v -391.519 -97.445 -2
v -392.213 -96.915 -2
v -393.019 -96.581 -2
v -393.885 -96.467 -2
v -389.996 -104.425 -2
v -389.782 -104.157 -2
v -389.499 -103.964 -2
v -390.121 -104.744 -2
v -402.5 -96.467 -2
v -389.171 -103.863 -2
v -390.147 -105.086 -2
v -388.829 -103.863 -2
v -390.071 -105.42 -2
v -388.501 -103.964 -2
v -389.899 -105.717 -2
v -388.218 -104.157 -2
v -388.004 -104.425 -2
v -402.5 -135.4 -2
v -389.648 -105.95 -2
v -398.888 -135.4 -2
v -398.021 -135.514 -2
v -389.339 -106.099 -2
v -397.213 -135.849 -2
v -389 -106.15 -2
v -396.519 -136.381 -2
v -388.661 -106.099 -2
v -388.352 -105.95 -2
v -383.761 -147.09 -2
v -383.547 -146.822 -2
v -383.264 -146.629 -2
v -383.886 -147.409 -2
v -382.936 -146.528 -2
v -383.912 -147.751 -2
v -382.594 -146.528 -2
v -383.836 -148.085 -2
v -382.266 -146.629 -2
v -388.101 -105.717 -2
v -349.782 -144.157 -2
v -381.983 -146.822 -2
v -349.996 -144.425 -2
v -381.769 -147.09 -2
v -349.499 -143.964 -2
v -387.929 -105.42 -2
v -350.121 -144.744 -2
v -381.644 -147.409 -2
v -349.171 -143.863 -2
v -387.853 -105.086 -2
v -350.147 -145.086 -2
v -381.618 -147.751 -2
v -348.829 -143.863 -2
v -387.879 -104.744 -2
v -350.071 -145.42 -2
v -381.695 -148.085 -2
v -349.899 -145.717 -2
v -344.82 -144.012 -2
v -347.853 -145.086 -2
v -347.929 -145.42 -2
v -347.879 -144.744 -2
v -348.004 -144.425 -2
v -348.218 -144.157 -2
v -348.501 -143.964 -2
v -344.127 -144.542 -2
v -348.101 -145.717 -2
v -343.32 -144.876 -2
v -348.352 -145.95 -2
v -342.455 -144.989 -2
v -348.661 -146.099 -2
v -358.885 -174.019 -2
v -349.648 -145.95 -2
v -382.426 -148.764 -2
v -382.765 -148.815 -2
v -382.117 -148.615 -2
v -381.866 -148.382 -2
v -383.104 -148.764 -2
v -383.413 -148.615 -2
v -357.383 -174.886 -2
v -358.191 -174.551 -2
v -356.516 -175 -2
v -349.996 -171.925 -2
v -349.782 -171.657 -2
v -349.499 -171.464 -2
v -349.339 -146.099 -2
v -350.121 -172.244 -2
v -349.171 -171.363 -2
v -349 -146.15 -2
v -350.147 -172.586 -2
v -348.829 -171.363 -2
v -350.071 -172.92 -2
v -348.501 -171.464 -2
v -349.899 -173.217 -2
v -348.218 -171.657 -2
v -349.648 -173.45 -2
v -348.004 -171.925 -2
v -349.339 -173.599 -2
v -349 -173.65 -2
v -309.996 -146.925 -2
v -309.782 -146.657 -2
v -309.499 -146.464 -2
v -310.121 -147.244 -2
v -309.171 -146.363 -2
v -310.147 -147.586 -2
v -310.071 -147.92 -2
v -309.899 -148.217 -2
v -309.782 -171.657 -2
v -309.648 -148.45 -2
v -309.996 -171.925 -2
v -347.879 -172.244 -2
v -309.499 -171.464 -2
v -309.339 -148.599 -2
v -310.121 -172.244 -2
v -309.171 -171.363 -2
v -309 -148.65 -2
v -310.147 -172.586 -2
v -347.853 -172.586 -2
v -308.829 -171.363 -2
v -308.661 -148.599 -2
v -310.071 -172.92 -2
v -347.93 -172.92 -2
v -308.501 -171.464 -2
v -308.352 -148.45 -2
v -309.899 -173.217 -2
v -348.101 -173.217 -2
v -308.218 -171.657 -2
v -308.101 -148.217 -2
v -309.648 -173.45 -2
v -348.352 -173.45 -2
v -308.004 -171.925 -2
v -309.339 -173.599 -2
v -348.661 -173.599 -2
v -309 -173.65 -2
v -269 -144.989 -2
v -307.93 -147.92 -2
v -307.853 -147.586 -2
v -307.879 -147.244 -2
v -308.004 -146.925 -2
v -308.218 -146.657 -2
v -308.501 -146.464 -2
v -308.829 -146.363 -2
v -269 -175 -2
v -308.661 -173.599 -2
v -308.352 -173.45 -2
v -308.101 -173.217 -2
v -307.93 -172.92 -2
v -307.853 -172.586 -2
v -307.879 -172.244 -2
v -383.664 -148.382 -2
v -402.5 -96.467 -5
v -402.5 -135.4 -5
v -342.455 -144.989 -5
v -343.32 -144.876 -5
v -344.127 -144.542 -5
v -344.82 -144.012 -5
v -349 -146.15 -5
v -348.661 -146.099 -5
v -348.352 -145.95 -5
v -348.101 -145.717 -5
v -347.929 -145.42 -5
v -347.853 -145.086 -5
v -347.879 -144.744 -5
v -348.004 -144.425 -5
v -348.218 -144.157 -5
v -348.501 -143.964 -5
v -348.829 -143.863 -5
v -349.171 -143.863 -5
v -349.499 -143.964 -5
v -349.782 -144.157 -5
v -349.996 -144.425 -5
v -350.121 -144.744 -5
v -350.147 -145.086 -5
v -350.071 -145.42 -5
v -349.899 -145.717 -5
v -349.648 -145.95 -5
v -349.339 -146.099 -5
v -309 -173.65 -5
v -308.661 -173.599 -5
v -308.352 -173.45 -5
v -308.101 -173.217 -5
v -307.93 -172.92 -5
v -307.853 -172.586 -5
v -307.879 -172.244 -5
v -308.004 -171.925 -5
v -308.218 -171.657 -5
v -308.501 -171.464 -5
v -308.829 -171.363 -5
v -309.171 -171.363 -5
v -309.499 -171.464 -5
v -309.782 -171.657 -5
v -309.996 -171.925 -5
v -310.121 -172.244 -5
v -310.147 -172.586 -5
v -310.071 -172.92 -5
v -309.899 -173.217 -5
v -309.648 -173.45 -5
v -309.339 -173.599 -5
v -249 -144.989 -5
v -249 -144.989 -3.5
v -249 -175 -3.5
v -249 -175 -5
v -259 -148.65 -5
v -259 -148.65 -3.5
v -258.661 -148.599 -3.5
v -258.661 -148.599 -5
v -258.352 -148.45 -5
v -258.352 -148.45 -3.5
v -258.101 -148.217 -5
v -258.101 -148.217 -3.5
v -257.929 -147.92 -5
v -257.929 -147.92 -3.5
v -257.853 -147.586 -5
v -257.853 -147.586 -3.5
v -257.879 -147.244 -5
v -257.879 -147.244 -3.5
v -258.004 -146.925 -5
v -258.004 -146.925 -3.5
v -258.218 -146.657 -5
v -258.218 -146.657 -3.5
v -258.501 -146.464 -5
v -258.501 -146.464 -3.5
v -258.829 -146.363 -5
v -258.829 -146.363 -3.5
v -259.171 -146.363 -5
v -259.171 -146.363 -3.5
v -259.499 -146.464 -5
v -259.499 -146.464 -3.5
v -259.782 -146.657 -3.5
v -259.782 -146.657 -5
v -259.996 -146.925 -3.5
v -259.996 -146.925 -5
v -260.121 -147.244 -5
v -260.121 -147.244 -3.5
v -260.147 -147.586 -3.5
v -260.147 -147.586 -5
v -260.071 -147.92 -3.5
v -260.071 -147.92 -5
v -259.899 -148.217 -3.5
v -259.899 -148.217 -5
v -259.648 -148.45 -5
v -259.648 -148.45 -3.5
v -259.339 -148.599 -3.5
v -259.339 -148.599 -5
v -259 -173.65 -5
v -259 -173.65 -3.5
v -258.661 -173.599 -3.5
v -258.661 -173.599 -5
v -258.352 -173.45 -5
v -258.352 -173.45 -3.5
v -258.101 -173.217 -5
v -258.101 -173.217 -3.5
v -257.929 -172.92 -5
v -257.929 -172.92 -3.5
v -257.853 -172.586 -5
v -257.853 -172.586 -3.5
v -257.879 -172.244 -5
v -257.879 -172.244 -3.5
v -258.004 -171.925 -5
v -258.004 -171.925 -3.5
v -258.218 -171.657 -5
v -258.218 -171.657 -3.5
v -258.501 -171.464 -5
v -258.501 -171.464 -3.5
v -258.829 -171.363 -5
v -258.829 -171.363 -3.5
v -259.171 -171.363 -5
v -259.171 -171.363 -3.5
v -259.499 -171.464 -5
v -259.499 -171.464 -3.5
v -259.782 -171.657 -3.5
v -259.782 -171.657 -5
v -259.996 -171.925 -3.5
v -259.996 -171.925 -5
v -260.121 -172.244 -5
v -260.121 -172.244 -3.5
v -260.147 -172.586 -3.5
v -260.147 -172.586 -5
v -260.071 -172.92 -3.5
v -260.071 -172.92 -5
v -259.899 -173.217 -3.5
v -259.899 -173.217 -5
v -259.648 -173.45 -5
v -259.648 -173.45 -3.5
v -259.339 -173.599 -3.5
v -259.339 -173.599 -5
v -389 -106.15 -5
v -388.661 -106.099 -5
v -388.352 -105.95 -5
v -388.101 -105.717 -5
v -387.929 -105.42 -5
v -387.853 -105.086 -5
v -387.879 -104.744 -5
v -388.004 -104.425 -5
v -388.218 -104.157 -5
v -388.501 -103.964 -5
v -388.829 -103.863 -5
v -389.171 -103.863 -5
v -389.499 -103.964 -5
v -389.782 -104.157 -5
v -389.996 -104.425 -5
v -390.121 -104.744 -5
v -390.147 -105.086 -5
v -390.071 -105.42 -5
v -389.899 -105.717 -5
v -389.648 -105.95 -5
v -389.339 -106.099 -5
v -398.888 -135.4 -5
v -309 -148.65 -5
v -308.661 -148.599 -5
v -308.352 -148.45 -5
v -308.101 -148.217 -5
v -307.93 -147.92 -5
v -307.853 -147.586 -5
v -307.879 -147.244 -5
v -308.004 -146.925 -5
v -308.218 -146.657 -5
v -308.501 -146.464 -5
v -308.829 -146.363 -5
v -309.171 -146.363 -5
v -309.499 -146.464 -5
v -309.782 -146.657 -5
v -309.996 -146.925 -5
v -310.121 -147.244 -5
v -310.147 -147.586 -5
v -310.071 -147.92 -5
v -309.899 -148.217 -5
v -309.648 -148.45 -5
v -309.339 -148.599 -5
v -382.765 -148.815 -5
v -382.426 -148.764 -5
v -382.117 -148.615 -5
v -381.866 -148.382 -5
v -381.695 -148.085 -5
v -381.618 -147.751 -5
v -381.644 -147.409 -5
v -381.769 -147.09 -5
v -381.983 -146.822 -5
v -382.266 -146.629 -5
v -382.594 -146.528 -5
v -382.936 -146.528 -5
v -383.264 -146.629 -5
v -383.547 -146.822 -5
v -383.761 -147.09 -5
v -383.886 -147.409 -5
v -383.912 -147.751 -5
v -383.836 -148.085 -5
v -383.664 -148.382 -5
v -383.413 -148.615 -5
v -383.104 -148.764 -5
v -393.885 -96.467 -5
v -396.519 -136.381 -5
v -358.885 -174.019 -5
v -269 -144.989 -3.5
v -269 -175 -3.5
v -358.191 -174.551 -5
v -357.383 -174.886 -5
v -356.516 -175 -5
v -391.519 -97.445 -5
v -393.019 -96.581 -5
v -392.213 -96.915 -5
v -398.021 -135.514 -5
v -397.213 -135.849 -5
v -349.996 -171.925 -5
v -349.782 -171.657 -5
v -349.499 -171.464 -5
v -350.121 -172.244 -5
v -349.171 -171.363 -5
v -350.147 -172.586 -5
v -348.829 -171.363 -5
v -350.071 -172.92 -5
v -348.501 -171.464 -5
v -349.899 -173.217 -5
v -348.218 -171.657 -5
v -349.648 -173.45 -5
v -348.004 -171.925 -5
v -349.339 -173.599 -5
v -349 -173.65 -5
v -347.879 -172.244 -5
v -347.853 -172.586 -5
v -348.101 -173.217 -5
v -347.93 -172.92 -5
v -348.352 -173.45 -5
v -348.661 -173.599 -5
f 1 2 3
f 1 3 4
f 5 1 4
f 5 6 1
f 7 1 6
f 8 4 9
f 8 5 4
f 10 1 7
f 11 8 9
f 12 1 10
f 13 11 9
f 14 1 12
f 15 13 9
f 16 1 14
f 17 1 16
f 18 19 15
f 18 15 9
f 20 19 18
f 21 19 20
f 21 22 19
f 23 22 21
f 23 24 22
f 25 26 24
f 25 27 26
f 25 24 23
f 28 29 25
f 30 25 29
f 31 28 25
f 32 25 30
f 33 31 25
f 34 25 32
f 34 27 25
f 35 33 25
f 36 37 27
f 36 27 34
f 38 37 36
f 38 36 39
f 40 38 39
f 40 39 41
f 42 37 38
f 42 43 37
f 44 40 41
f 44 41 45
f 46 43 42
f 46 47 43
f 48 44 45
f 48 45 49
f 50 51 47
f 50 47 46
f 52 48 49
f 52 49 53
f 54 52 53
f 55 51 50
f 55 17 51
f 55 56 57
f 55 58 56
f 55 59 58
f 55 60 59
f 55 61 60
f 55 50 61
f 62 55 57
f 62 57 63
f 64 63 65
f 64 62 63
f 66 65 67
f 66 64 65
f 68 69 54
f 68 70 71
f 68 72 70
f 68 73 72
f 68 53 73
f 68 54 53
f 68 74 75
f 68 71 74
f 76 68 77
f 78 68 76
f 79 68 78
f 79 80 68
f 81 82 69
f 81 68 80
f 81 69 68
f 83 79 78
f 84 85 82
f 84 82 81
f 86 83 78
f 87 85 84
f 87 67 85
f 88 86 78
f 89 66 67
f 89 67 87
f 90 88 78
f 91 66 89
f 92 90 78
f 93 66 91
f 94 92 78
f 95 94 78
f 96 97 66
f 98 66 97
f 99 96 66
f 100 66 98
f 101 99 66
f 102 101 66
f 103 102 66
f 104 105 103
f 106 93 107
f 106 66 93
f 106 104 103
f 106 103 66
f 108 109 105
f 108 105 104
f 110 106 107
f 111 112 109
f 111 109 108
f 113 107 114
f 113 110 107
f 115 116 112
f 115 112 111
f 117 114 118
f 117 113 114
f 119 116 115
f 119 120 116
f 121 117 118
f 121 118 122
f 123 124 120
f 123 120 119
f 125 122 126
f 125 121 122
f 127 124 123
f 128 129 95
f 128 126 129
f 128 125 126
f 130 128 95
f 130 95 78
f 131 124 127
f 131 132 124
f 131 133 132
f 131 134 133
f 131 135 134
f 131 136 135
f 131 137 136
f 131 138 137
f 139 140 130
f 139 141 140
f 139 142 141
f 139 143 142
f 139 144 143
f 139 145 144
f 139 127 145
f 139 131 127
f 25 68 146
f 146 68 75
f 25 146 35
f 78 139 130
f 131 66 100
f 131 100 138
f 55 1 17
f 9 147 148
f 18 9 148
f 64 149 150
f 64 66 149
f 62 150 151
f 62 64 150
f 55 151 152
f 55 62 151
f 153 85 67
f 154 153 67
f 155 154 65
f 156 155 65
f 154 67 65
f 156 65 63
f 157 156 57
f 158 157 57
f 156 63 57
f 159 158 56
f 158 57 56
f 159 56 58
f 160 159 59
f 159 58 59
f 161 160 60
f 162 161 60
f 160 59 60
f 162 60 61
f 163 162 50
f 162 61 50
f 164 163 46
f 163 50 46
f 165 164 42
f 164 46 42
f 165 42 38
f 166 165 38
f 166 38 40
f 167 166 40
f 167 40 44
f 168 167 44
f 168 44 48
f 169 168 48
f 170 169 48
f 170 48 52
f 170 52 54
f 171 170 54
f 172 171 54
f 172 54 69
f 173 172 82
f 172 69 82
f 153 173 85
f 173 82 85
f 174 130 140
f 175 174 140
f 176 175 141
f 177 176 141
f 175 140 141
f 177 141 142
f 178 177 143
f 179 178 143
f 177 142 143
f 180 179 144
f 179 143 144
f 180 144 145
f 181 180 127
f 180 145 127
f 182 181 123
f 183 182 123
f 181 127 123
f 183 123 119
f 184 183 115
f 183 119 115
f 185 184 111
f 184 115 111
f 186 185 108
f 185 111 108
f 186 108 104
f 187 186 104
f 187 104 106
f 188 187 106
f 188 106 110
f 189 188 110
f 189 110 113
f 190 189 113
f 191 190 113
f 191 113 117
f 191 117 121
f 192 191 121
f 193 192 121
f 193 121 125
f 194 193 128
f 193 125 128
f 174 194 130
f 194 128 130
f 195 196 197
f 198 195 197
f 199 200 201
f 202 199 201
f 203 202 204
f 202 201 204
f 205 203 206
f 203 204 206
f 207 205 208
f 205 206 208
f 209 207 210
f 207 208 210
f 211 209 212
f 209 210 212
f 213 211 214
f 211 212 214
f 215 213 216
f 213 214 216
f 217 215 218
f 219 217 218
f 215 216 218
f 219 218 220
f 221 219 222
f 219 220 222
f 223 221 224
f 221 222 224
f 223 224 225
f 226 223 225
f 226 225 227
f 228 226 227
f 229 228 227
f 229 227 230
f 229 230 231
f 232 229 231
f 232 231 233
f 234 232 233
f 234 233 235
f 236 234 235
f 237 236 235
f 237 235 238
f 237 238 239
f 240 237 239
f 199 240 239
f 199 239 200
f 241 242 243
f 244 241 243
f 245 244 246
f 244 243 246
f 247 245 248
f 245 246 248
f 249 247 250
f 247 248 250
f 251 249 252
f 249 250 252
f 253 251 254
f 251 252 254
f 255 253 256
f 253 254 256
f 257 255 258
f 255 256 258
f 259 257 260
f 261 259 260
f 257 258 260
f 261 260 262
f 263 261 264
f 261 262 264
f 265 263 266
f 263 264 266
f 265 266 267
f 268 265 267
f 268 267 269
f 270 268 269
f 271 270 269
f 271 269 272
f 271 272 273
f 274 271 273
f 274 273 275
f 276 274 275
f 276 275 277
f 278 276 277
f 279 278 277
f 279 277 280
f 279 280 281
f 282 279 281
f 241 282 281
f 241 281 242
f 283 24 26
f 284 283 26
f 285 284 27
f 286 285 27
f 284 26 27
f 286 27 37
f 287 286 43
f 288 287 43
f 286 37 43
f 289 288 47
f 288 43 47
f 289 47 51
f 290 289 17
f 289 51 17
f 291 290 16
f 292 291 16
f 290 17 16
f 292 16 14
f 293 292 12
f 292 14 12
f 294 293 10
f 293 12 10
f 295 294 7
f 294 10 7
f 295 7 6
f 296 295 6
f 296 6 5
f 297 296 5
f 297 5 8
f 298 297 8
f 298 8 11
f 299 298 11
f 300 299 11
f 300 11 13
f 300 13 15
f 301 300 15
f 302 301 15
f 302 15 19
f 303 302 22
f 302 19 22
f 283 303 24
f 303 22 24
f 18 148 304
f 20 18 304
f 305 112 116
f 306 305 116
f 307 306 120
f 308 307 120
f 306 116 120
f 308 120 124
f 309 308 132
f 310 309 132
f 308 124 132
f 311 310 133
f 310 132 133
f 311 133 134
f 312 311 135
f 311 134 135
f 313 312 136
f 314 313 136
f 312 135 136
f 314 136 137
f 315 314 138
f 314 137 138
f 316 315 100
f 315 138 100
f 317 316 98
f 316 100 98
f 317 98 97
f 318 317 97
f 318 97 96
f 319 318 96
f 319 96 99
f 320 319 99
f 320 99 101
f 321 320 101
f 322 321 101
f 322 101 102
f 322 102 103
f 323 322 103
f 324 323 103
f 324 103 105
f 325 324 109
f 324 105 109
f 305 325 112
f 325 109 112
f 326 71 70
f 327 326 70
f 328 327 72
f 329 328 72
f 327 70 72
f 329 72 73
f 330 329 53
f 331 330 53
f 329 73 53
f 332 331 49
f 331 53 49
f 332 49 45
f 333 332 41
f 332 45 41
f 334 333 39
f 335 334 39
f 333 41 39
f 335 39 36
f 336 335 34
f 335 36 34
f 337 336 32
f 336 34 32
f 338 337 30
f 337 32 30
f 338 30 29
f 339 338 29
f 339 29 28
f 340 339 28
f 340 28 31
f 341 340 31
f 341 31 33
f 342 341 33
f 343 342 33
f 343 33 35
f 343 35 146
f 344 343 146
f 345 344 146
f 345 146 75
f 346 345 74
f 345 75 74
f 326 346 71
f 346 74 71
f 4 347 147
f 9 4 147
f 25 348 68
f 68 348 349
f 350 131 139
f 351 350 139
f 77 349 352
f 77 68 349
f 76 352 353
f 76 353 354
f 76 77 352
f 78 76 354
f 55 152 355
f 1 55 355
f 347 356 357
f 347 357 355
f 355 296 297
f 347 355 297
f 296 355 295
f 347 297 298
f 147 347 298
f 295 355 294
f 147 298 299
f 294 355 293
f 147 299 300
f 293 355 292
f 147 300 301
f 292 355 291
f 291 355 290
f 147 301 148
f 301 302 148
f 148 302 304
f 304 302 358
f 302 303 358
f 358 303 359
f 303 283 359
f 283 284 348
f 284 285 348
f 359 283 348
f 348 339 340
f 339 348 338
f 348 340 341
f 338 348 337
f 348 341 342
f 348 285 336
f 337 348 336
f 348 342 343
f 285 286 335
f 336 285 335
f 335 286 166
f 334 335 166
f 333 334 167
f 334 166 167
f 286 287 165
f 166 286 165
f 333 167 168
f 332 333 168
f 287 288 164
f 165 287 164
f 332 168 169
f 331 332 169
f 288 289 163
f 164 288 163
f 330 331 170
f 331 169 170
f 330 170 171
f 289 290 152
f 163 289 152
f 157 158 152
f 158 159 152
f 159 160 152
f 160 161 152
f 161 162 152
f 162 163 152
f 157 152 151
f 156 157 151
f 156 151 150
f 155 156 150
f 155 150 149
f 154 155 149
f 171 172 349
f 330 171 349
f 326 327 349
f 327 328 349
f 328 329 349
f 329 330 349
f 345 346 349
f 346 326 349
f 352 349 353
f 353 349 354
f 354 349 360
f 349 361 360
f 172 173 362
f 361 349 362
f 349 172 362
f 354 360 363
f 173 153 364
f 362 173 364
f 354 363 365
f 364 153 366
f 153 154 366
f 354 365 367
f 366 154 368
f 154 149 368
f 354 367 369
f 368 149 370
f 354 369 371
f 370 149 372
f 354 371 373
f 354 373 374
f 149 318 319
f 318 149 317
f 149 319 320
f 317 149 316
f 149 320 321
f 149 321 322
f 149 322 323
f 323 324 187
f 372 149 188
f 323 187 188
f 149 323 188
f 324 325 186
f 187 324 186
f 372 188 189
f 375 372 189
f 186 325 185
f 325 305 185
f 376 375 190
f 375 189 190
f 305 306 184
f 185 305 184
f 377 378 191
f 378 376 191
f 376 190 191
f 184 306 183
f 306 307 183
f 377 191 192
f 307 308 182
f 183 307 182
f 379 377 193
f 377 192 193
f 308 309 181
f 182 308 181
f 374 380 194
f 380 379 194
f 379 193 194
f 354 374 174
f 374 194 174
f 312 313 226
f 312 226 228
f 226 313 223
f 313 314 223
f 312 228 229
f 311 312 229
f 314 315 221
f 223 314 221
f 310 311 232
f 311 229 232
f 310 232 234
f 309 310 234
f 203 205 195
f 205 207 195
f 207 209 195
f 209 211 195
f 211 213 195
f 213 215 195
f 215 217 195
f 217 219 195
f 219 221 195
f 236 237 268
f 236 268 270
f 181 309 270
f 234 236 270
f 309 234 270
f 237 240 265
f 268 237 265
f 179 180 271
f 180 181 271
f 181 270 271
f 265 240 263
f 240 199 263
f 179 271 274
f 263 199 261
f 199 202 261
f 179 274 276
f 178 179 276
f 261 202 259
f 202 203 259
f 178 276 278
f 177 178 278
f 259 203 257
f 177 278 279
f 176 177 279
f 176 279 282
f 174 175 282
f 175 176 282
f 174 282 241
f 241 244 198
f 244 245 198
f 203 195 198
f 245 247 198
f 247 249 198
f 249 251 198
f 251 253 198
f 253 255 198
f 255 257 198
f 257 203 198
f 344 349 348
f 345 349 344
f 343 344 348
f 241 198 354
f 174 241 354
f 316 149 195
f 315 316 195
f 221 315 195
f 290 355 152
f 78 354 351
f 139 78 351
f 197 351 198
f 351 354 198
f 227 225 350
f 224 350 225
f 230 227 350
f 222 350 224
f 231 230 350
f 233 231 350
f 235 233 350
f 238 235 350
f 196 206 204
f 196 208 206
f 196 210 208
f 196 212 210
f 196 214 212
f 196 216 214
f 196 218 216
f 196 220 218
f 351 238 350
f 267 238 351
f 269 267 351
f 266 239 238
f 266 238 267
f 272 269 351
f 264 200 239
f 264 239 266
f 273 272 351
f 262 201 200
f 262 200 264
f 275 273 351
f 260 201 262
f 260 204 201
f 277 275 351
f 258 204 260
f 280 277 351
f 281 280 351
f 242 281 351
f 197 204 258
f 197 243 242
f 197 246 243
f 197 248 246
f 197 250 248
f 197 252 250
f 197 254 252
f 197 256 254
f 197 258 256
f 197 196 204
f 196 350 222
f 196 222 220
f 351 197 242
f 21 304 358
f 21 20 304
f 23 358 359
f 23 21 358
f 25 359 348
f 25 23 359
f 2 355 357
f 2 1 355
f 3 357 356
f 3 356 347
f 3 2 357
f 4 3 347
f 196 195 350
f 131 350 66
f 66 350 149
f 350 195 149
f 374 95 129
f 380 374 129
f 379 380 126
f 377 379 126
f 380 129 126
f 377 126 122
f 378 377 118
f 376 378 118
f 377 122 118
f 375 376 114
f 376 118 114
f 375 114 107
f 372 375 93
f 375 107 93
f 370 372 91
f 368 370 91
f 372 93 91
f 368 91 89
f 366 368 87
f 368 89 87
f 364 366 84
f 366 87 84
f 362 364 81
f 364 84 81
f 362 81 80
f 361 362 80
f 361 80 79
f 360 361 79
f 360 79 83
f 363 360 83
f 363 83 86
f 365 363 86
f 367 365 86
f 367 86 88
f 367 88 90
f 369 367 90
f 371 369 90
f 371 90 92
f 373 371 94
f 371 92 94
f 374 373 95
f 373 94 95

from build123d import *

# Parameters (mm, degrees)
PAD011_DEPTH            = 3
FILLET036_R             = 3.35
SKETCH183_R             = 1.15
POCKET052_DEPTH         = 3
POCKET054_DEPTH         = 5
SKETCH187_W             = 31
SKETCH187_H             = 20
POCKET055_DEPTH         = 1.5
BODY023_ROLL_ANGLE      = 180
BODY023_PLACEMENT_ANGLE = -90


with BuildPart() as part:
    # Sketch182 → Pad011 (new body)
    with BuildSketch(Plane(origin=(0, 0, 0), x_dir=(1, 0, 0), z_dir=(0, 0, -1))):
        Polygon((101.467362, -402.500006), (130.400002, -402.500006), (135.400002, -402.500006), (135.400002, -397.500006), (174.999975, -357.90402), (174.999975, -245), (289.999995, -245), (294.999995, -245), (294.999995, -215), (289.999995, -215), (224.999995, -215), (224.999995, -199.999997), (219.999995, -199.999997), (199.999995, -199.999997), (194.999995, -199.999997), (194.999995, -215.000003), (168.459985, -215.000003), (161.999993, -198.359996), (161.999993, -115.000006), (161.999993, -110.000006), (156.999993, -110.000006), (134.576923, -122.534363), (131.999997, -126.895911), (131.999997, -200.027011), (144.989344, -239.967928), (144.989344, -343.839368), (96.467362, -392.500006), (96.467362, -397.500006), (96.467362, -402.500006), align=None)
    extrude(amount=PAD011_DEPTH)

    # Fillet036
    fillet036_edges = [part.edges().sort_by_distance(p)[0] for p in [
        (194.999995, 215.000003, -1.5),
        (168.459985, 215.000003, -1.5),
        (161.999993, 198.359996, -1.5),
        (161.999993, 110.000006, -1.5),
        (156.999993, 110.000006, -1.5),
        (134.576923, 122.534363, -1.5),
        (131.999997, 126.895911, -1.5),
        (131.999997, 200.027011, -1.5),
        (144.989344, 239.967928, -1.5),
        (144.989344, 343.839368, -1.5),
        (96.467362, 392.500006, -1.5),
        (135.400002, 397.500006, -1.5),
        (174.999975, 357.90402, -1.5),
        (174.999975, 245, -1.5),
        (294.999995, 245, -1.5),
        (294.999995, 215, -1.5),
        (224.999995, 215, -1.5),
    ]]
    fillet(fillet036_edges, radius=FILLET036_R)

    # Sketch183 (on Face5 of Fillet036) → Pocket052 (cut)
    with BuildSketch(Plane(origin=(0, 0, -3), x_dir=(1, 0, 0), z_dir=(0, 0, -1))):
        with Locations((105, -389)):
            Circle(SKETCH183_R)
        with Locations((145, -349)):
            Circle(SKETCH183_R)
        with Locations((147.500002, -309.000005)):
            Circle(SKETCH183_R)
        with Locations((147.500002, -259.000004)):
            Circle(SKETCH183_R)
        with Locations((172.500003, -259.000004)):
            Circle(SKETCH183_R)
        with Locations((172.500003, -309.000005)):
            Circle(SKETCH183_R)
        with Locations((172.500003, -349.000005)):
            Circle(SKETCH183_R)
        with Locations((147.665007, -382.765018)):
            Circle(SKETCH183_R)
        with Locations((178.000003, -242.500004)):
            Circle(SKETCH183_R)
        with Locations((218.000003, -242.500004)):
            Circle(SKETCH183_R)
        with Locations((258.000004, -242.500004)):
            Circle(SKETCH183_R)
        with Locations((258.000004, -217.500003)):
            Circle(SKETCH183_R)
        with Locations((292, -242.500004)):
            Circle(SKETCH183_R)
        with Locations((292.000004, -217.500003)):
            Circle(SKETCH183_R)
        with Locations((292.500004, -230.000003)):
            Circle(SKETCH183_R)
        with Locations((223.000003, -217.000003)):
            Circle(SKETCH183_R)
        with Locations((197, -217)):
            Circle(SKETCH183_R)
        with Locations((166.109996, -217.109995)):
            Circle(SKETCH183_R)
        with Locations((147.500002, -239)):
            Circle(SKETCH183_R)
        with Locations((141, -220)):
            Circle(SKETCH183_R)
        with Locations((134.427551, -201)):
            Circle(SKETCH183_R)
        with Locations((160.149996, -200.999996)):
            Circle(SKETCH183_R)
        with Locations((134.427551, -161)):
            Circle(SKETCH183_R)
        with Locations((159.500002, -161.000002)):
            Circle(SKETCH183_R)
        with Locations((137, -124)):
            Circle(SKETCH183_R)
        with Locations((146.849997, -118.149997)):
            Circle(SKETCH183_R)
        with Locations((159, -113)):
            Circle(SKETCH183_R)
    extrude(amount=-POCKET052_DEPTH, mode=Mode.SUBTRACT)

    # Sketch186 (on Face5 of Pocket052) → Pocket054 (cut)
    with BuildSketch(Plane(origin=(0, 0, -3), x_dir=(1, 0, 0), z_dir=(0, 0, -1))):
        Polygon((175, -249), (130, -249), (130, -100), (170, -100), (170, -190), (300, -190), (300, -249), align=None)
    extrude(amount=-POCKET054_DEPTH, mode=Mode.SUBTRACT)

    # Sketch187 (on Face25 of Pocket054) → Pocket055 (cut)
    with BuildSketch(Plane(origin=(0, 0, -3), x_dir=(1, 0, 0), z_dir=(0, 0, -1))):
        with Locations((159.5, -259)):
            Rectangle(SKETCH187_W, SKETCH187_H)
    extrude(amount=-POCKET055_DEPTH, mode=Mode.SUBTRACT)


with BuildPart() as part_1:
    # Body023 roll: moved
    add(part.part.rotate(Axis((0, 0, 0), (1, 0, 0)), BODY023_ROLL_ANGLE))


with BuildPart() as part_2:
    # Body023 placement: moved
    add(part_1.part.moved(Location((0, 0, -5))).rotate(Axis((0, 0, -5), (0, 0, 1)), BODY023_PLACEMENT_ANGLE))


solid = part_2.part
